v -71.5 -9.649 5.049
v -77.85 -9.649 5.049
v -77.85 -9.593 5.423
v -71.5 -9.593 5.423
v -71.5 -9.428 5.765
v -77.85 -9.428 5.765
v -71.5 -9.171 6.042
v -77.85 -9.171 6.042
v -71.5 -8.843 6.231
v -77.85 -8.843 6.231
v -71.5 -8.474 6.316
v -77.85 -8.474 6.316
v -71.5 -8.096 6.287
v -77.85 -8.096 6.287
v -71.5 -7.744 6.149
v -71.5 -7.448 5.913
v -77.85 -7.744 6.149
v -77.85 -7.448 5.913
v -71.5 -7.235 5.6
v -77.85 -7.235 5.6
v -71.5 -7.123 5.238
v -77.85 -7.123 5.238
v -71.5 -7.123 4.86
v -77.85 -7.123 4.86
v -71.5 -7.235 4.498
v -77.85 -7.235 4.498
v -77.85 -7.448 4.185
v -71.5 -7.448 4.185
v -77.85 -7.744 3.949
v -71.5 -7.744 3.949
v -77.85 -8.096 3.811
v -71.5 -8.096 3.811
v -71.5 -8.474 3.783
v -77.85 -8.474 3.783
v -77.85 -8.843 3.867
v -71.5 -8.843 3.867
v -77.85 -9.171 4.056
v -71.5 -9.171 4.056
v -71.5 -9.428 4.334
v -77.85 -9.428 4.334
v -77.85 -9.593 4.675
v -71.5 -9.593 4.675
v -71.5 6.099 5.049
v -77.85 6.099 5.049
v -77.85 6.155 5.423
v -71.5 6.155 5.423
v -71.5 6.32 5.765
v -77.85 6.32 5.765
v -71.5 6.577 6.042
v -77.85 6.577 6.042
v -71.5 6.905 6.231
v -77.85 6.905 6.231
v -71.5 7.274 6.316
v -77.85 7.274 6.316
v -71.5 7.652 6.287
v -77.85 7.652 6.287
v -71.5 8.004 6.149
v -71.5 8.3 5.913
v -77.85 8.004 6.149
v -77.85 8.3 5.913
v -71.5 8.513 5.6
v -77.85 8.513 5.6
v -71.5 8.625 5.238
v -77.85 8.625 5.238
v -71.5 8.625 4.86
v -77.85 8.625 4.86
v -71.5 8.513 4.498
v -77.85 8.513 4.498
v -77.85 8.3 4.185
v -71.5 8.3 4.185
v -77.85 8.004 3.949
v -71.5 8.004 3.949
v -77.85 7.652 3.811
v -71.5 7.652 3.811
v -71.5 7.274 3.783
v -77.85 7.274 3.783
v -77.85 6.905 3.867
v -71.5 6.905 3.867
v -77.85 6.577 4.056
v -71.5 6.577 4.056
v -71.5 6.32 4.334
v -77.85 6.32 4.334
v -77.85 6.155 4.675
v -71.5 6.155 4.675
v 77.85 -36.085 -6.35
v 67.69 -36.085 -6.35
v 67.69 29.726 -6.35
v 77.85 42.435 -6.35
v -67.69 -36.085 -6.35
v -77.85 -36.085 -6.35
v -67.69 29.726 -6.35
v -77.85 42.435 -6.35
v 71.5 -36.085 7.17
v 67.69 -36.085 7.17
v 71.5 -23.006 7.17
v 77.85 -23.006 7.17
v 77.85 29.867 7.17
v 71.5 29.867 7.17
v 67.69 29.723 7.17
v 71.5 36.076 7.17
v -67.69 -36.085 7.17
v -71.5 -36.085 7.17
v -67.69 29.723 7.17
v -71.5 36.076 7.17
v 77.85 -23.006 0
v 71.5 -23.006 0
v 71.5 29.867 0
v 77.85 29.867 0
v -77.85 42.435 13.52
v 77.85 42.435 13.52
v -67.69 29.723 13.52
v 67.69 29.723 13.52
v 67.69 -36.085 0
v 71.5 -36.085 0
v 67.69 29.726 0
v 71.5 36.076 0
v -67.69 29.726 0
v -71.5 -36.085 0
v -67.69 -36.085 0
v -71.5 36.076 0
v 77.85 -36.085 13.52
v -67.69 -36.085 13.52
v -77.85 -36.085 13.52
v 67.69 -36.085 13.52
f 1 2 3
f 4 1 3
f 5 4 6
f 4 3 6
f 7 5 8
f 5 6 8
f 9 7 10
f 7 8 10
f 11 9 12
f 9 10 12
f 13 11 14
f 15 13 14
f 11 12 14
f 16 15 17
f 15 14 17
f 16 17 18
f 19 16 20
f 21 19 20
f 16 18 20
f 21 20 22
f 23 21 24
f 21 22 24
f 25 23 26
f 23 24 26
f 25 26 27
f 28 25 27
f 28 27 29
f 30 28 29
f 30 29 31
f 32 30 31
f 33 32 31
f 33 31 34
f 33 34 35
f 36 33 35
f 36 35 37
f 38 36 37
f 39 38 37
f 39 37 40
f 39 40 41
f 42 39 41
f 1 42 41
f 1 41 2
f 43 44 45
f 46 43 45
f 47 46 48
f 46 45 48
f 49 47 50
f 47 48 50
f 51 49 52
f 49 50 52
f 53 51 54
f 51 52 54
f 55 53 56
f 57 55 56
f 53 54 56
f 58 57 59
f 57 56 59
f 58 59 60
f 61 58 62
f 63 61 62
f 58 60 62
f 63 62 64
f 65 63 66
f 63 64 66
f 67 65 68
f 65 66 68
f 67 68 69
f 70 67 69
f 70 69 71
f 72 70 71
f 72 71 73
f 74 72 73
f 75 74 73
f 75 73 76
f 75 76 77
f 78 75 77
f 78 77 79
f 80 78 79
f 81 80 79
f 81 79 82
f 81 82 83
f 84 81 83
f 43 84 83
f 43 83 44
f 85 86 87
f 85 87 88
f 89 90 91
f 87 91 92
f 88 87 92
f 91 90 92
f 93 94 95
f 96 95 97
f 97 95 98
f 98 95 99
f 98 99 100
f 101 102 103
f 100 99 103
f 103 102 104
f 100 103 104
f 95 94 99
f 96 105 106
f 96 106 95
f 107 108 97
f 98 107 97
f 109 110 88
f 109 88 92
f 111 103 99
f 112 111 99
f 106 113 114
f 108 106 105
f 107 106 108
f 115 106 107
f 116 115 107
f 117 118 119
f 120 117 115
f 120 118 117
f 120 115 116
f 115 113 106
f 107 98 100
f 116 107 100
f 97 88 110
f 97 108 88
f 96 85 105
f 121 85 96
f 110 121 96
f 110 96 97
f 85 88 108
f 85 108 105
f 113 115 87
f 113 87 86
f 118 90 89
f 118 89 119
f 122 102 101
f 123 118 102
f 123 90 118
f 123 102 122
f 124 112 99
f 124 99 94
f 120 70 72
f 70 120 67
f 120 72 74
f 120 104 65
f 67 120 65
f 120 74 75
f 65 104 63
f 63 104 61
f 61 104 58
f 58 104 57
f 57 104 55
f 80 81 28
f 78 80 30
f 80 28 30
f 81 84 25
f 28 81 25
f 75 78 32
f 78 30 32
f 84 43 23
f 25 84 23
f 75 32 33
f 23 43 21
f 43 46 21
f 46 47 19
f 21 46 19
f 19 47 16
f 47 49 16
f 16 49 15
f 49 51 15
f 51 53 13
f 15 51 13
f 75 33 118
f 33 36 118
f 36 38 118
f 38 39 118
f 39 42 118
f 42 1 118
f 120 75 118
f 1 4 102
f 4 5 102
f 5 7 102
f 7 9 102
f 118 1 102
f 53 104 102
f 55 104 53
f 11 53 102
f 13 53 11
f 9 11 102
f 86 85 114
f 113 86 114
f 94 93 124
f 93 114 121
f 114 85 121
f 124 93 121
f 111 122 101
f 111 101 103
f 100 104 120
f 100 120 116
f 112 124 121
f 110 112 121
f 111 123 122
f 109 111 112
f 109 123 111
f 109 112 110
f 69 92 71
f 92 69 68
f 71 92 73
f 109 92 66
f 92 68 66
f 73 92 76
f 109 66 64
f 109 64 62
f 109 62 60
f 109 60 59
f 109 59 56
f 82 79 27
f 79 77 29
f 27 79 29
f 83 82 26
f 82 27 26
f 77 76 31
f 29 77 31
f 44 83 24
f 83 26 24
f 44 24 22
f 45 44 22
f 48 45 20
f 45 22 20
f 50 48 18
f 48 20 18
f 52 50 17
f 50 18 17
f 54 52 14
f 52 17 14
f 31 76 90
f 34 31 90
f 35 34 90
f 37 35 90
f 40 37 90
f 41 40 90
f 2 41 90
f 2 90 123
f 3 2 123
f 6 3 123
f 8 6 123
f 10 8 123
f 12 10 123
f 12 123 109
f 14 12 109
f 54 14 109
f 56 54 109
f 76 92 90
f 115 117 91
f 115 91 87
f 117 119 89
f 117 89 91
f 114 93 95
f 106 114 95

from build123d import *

# Parameters (mm, degrees)
F0_W      = 143
F0_H      = 72.17
F1_DEPTH  = 7.17
F2_W      = 72.17
F2_H      = 19.87
F3_DEPTH  = 6.35
F4_W      = 72.17
F4_H      = 19.87
F5_DEPTH  = 6.35
F6_W      = 143
F6_H      = 6.3621380544
F7_DEPTH  = 6.35
F8_W      = 143
F8_H      = 6.358533836
F9_DEPTH  = 6.35
F10_W     = 155.7
F10_H     = 19.87
F11_DEPTH = 6.35
F12_W     = 143
F12_H     = 7.17
F13_DEPTH = 65.811466164
F14_W     = 143
F14_H     = 7.17
F15_DEPTH = 6.35
F16_W     = 65.811466164
F16_H     = 6.35
F17_DEPTH = 3.81
F18_W     = 65.8105651094
F18_H     = 6.35
F19_DEPTH = 3.81
F20_W     = 65.811466164
F20_H     = 6.35
F21_DEPTH = 3.81
F22_W     = 65.8105651094
F22_H     = 6.35
F23_DEPTH = 3.81
F24_W     = 52.8727266937
F24_H     = 7.17
F25_DEPTH = 25.4
F26_R     = 1.27
F27_DEPTH = 149.35


with BuildPart() as f1:
    # F0 (on Top) → F1 (new body)
    with BuildSketch(Plane.XY):
        Rectangle(F0_W, F0_H)
    extrude(amount=F1_DEPTH)

    # F2 (on face) → F3 (join)
    with BuildSketch(Plane.YZ.offset(71.5)):
        with Locations((0, 3.585)):
            Rectangle(F2_W, F2_H)
    extrude(amount=F3_DEPTH)

    # F4 (on face) → F5 (join)
    with BuildSketch(Plane(origin=(-71.5, 0, 0), x_dir=(0, -1, 0), z_dir=(-1, 0, 0))):
        with Locations((0, 3.585)):
            Rectangle(F4_W, F4_H)
    extrude(amount=F5_DEPTH)

    # F6 (on face) → F7 (join)
    with BuildSketch(Plane.XY.offset(7.17)):
        with Locations((0, 32.9039309728)):
            Rectangle(F6_W, F6_H)
    extrude(amount=F7_DEPTH)

    # F8 (on face) → F9 (join)
    with BuildSketch(Plane(origin=(0, 0, 0), x_dir=(1, 0, 0), z_dir=(0, 0, -1))):
        with Locations((0, -32.905733082)):
            Rectangle(F8_W, F8_H)
    extrude(amount=F9_DEPTH)

    # F10 (on face) → F11 (join)
    with BuildSketch(Plane(origin=(0, 36.085, 0), x_dir=(-1, 0, 0), z_dir=(0, 1, 0))):
        with Locations((0, 3.585)):
            Rectangle(F10_W, F10_H)
    extrude(amount=F11_DEPTH)

    # F12 (on face) → F13 (cut, through all)
    with BuildSketch(Plane.XZ.offset(36.085)):
        with Locations((0, 3.585)):
            Rectangle(F12_W, F12_H)
    extrude(amount=-F13_DEPTH, mode=Mode.SUBTRACT)

    # F14 (on face) → F15 (cut)
    with BuildSketch(Plane.XZ.offset(-29.726466164)):
        with Locations((0, 3.585)):
            Rectangle(F14_W, F14_H)
    extrude(amount=-F15_DEPTH, mode=Mode.SUBTRACT)

    # F16 (on face) → F17 (join)
    with BuildSketch(Plane(origin=(71.5, 0, 0), x_dir=(0, -1, 0), z_dir=(-1, 0, 0))):
        with Locations((3.179266918, -3.175)):
            Rectangle(F16_W, F16_H)
    extrude(amount=F17_DEPTH)

    # F18 (on face) → F19 (join)
    with BuildSketch(Plane(origin=(71.5, 0, 0), x_dir=(0, -1, 0), z_dir=(-1, 0, 0))):
        with Locations((3.1797174453, 10.345)):
            Rectangle(F18_W, F18_H)
    extrude(amount=F19_DEPTH)

    # F20 (on face) → F21 (join)
    with BuildSketch(Plane.YZ.offset(-71.5)):
        with Locations((-3.179266918, -3.175)):
            Rectangle(F20_W, F20_H)
    extrude(amount=F21_DEPTH)

    # F22 (on face) → F23 (join)
    with BuildSketch(Plane.YZ.offset(-71.5)):
        with Locations((-3.1797174453, 10.345)):
            Rectangle(F22_W, F22_H)
    extrude(amount=F23_DEPTH)

    # F24 (on face) → F25 (cut)
    with BuildSketch(Plane.YZ.offset(77.85)):
        with Locations((3.4307548776, 3.585)):
            Rectangle(F24_W, F24_H)
    extrude(amount=-F25_DEPTH, mode=Mode.SUBTRACT)

    # F26 (on face) → F27 (cut, through all)
    with BuildSketch(Plane(origin=(-77.85, 0, 0), x_dir=(0, -1, 0), z_dir=(-1, 0, 0))):
        with Locations((-7.3689044776, 5.0491553406)):
            Circle(F26_R)
        with Locations((8.3790955224, 5.0491553406)):
            Circle(F26_R)
    extrude(amount=-F27_DEPTH, mode=Mode.SUBTRACT)


solid = f1.part
